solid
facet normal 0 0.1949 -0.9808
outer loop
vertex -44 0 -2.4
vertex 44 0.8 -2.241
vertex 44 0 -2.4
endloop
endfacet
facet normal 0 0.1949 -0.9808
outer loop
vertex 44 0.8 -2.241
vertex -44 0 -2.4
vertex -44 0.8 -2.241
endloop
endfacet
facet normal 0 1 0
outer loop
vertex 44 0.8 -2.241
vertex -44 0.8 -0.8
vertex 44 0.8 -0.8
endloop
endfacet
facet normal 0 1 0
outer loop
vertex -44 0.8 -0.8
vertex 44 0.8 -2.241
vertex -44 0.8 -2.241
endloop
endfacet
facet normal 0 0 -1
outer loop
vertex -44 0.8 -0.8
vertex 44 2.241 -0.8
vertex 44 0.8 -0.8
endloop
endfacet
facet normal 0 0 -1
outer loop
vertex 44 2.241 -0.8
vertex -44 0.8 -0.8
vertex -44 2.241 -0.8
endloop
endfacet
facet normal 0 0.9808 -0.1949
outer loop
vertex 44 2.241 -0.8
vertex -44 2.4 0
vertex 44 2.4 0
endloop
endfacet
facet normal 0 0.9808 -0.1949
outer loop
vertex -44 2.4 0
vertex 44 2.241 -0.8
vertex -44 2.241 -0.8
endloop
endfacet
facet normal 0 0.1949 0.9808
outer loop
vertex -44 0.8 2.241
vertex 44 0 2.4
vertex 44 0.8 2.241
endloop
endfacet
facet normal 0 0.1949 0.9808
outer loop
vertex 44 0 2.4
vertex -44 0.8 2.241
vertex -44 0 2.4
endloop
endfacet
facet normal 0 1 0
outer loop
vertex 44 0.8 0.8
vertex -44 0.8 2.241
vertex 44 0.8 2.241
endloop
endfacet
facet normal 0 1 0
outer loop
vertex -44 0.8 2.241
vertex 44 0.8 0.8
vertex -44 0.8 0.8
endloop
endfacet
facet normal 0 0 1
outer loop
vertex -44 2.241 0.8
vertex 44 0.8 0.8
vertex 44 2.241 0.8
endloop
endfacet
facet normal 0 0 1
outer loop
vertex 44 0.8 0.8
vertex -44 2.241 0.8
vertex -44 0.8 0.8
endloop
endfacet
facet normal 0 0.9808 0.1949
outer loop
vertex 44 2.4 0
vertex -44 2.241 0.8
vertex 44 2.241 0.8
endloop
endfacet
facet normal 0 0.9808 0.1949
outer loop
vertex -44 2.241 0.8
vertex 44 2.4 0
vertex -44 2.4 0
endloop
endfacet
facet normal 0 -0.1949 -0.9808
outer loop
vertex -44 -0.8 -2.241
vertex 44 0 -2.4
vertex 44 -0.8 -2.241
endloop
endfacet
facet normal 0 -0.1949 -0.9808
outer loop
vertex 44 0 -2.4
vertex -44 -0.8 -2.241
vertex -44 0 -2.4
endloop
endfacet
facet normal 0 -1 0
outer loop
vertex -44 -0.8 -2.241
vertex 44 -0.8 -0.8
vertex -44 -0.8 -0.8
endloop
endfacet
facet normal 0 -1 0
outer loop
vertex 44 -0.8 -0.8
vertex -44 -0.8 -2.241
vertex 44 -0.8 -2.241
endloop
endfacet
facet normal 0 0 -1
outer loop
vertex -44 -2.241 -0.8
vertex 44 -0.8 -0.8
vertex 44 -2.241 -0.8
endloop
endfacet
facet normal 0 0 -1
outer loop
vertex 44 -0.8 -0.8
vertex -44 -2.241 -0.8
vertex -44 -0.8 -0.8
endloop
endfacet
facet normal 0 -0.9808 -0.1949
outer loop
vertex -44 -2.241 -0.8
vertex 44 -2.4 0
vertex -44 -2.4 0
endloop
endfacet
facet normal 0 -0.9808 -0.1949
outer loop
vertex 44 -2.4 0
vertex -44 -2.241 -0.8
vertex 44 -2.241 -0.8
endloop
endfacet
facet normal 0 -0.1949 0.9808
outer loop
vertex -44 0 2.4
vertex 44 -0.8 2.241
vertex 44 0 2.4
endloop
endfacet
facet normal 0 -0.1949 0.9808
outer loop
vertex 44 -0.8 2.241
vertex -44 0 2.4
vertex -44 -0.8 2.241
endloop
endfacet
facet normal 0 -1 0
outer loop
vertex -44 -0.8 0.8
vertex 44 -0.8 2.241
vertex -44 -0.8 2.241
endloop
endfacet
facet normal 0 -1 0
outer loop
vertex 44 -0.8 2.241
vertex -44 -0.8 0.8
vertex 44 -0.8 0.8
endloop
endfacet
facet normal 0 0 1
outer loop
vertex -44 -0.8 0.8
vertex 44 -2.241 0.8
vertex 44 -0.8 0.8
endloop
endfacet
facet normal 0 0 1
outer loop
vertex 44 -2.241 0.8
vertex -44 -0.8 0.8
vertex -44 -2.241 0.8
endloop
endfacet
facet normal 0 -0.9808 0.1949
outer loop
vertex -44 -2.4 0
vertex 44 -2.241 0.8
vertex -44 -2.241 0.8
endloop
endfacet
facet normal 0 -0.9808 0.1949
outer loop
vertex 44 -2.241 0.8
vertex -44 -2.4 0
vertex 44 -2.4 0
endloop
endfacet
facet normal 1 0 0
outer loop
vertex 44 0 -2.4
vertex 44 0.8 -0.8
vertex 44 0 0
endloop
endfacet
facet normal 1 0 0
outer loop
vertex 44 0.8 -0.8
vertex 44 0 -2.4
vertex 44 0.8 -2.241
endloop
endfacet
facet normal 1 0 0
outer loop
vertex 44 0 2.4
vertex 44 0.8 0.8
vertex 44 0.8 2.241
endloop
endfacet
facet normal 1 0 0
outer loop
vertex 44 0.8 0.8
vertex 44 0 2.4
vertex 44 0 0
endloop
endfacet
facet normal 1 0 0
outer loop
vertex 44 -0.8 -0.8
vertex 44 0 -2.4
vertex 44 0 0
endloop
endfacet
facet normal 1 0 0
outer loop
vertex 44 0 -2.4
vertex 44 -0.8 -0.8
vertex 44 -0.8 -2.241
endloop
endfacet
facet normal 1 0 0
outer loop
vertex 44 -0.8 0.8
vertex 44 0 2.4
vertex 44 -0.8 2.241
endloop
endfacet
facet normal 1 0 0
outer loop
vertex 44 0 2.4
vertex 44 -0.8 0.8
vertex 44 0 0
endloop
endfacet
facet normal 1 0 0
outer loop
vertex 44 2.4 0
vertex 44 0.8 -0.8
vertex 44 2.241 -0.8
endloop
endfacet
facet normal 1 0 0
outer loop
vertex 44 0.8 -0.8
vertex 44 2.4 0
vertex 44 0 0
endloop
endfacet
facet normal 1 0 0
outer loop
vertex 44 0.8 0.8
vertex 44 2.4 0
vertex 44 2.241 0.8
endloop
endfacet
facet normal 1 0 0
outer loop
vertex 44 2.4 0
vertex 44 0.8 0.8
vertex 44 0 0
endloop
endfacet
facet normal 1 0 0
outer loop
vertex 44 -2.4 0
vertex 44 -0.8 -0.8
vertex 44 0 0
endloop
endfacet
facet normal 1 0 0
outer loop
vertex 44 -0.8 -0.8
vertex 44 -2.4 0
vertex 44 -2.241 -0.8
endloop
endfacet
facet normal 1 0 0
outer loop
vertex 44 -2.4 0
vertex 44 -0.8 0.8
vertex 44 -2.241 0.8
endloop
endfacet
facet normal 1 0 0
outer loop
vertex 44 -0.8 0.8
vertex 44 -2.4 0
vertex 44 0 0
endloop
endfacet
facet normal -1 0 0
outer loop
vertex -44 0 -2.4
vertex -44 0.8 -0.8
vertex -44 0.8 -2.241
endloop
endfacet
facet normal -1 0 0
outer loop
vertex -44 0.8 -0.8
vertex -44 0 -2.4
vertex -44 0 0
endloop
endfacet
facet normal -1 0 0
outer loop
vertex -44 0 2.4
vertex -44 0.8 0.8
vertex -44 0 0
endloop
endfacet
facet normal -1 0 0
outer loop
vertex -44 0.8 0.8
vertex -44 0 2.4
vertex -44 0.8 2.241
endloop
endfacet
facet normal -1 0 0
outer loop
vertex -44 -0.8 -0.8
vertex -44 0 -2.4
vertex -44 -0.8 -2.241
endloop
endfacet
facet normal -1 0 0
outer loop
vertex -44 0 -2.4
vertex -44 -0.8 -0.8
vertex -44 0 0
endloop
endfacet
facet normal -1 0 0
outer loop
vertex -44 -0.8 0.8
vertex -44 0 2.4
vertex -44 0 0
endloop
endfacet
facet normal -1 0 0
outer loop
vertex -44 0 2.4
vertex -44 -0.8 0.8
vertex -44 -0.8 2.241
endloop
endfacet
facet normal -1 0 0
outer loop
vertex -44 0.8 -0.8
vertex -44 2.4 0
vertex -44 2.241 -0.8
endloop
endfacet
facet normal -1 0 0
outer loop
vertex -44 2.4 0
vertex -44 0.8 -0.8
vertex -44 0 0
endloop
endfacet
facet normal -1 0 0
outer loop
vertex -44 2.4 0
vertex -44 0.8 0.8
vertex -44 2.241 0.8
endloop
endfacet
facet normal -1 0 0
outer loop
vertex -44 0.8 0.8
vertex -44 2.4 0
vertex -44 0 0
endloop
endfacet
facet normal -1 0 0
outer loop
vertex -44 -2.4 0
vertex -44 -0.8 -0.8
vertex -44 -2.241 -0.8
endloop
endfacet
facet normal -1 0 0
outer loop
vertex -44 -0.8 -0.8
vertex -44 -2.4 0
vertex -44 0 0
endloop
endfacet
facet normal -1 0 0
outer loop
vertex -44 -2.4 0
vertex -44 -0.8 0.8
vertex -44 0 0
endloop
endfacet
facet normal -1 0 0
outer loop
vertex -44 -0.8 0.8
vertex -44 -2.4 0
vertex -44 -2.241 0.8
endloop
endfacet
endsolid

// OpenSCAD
// file: ../p/axle.scad
use <../lib.scad>
function ldraw_lib__axle() = [
// 0 Axle
// 0 Name: axle.dat
// 0 Author: James Jessiman
// 0 !LDRAW_ORG Primitive UPDATE 2003-01
// 0 !LICENSE Licensed under CC BY 4.0 : see CAreadme.txt
// 
// 0 BFC CERTIFY CCW
  [0,"BFC","CERTIFY"],
  [0,"BFC","CCW"],
// 
// 0 !HISTORY 2000-04-23 [sbliss] Added conditional edges along outermost diameters
// 0 !HISTORY 2000-05-07 [PTadmin] Official Update 2000-01
// 0 !HISTORY 2002-11-08 [OrionP] Adjusted fit and precision
// 0 !HISTORY 2003-03-12 [PTadmin] Official Update 2003-01
// 0 !HISTORY 2007-06-24 [PTadmin] Header formatted for Contributor Agreement
// 0 !HISTORY 2008-07-01 [PTadmin] Official Update 2008-01
// 
// 
// 5 24 6 0 0 6 1 0 5.602 0 2 5.602 0 -2
  [5,24,6,0,0,6,1,0,5.602,0,2,5.602,0,-2],
// 5 24 0 0 6 0 1 6 2 0 5.602 -2 0 5.602
  [5,24,0,0,6,0,1,6,2,0,5.602,-2,0,5.602],
// 5 24 -6 0 0 -6 1 0 -5.602 0 -2 -5.602 0 2
  [5,24,-6,0,0,-6,1,0,-5.602,0,-2,-5.602,0,2],
// 5 24 0 0 -6 0 1 -6 -2 0 -5.602 2 0 -5.602
  [5,24,0,0,-6,0,1,-6,-2,0,-5.602,2,0,-5.602],
// 
// 2 24 6 0 0 5.602 0 2
  [2,24,6,0,0,5.602,0,2],
// 2 24 5.602 0 2 2 0 2
  [2,24,5.602,0,2,2,0,2],
// 2 24 2 0 2 2 0 5.602
  [2,24,2,0,2,2,0,5.602],
// 2 24 2 0 5.602 0 0 6
  [2,24,2,0,5.602,0,0,6],
// 2 24 -6 0 0 -5.602 0 2
  [2,24,-6,0,0,-5.602,0,2],
// 2 24 -5.602 0 2 -2 0 2
  [2,24,-5.602,0,2,-2,0,2],
// 2 24 -2 0 2 -2 0 5.602
  [2,24,-2,0,2,-2,0,5.602],
// 2 24 -2 0 5.602 -0 0 6
  [2,24,-2,0,5.602,-0,0,6],
// 2 24 6 0 -0 5.602 0 -2
  [2,24,6,0,-0,5.602,0,-2],
// 2 24 5.602 0 -2 2 0 -2
  [2,24,5.602,0,-2,2,0,-2],
// 2 24 2 0 -2 2 0 -5.602
  [2,24,2,0,-2,2,0,-5.602],
// 2 24 2 0 -5.602 0 0 -6
  [2,24,2,0,-5.602,0,0,-6],
// 2 24 -6 0 -0 -5.602 0 -2
  [2,24,-6,0,-0,-5.602,0,-2],
// 2 24 -5.602 0 -2 -2 0 -2
  [2,24,-5.602,0,-2,-2,0,-2],
// 2 24 -2 0 -2 -2 0 -5.602
  [2,24,-2,0,-2,-2,0,-5.602],
// 2 24 -2 0 -5.602 -0 0 -6
  [2,24,-2,0,-5.602,-0,0,-6],
// 2 24 6 1 0 5.602 1 2
  [2,24,6,1,0,5.602,1,2],
// 2 24 5.602 1 2 2 1 2
  [2,24,5.602,1,2,2,1,2],
// 2 24 2 1 2 2 1 5.602
  [2,24,2,1,2,2,1,5.602],
// 2 24 2 1 5.602 0 1 6
  [2,24,2,1,5.602,0,1,6],
// 2 24 -6 1 0 -5.602 1 2
  [2,24,-6,1,0,-5.602,1,2],
// 2 24 -5.602 1 2 -2 1 2
  [2,24,-5.602,1,2,-2,1,2],
// 2 24 -2 1 2 -2 1 5.602
  [2,24,-2,1,2,-2,1,5.602],
// 2 24 -2 1 5.602 -0 1 6
  [2,24,-2,1,5.602,-0,1,6],
// 2 24 6 1 -0 5.602 1 -2
  [2,24,6,1,-0,5.602,1,-2],
// 2 24 5.602 1 -2 2 1 -2
  [2,24,5.602,1,-2,2,1,-2],
// 2 24 2 1 -2 2 1 -5.602
  [2,24,2,1,-2,2,1,-5.602],
// 2 24 2 1 -5.602 0 1 -6
  [2,24,2,1,-5.602,0,1,-6],
// 2 24 -6 1 -0 -5.602 1 -2
  [2,24,-6,1,-0,-5.602,1,-2],
// 2 24 -5.602 1 -2 -2 1 -2
  [2,24,-5.602,1,-2,-2,1,-2],
// 2 24 -2 1 -2 -2 1 -5.602
  [2,24,-2,1,-2,-2,1,-5.602],
// 2 24 -2 1 -5.602 -0 1 -6
  [2,24,-2,1,-5.602,-0,1,-6],
// 
// 2 24 5.602 0 2 5.602 1 2
  [2,24,5.602,0,2,5.602,1,2],
// 2 24 2 0 2 2 1 2
  [2,24,2,0,2,2,1,2],
// 2 24 2 0 5.602 2 1 5.602
  [2,24,2,0,5.602,2,1,5.602],
// 2 24 -5.602 0 2 -5.602 1 2
  [2,24,-5.602,0,2,-5.602,1,2],
// 2 24 -2 0 2 -2 1 2
  [2,24,-2,0,2,-2,1,2],
// 2 24 -2 0 5.602 -2 1 5.602
  [2,24,-2,0,5.602,-2,1,5.602],
// 2 24 5.602 0 -2 5.602 1 -2
  [2,24,5.602,0,-2,5.602,1,-2],
// 2 24 2 0 -2 2 1 -2
  [2,24,2,0,-2,2,1,-2],
// 2 24 2 0 -5.602 2 1 -5.602
  [2,24,2,0,-5.602,2,1,-5.602],
// 2 24 -5.602 0 -2 -5.602 1 -2
  [2,24,-5.602,0,-2,-5.602,1,-2],
// 2 24 -2 0 -2 -2 1 -2
  [2,24,-2,0,-2,-2,1,-2],
// 2 24 -2 0 -5.602 -2 1 -5.602
  [2,24,-2,0,-5.602,-2,1,-5.602],
// 
// 4 16 6 0 0 6 1 0 5.602 1 2 5.602 0 2
  [4,16,6,0,0,6,1,0,5.602,1,2,5.602,0,2],
// 4 16 5.602 0 2 5.602 1 2 2 1 2 2 0 2
  [4,16,5.602,0,2,5.602,1,2,2,1,2,2,0,2],
// 4 16 2 0 2 2 1 2 2 1 5.602 2 0 5.602
  [4,16,2,0,2,2,1,2,2,1,5.602,2,0,5.602],
// 4 16 2 0 5.602 2 1 5.602 0 1 6 0 0 6
  [4,16,2,0,5.602,2,1,5.602,0,1,6,0,0,6],
// 4 16 -6 0 0 -5.602 0 2 -5.602 1 2 -6 1 0
  [4,16,-6,0,0,-5.602,0,2,-5.602,1,2,-6,1,0],
// 4 16 -5.602 0 2 -2 0 2 -2 1 2 -5.602 1 2
  [4,16,-5.602,0,2,-2,0,2,-2,1,2,-5.602,1,2],
// 4 16 -2 0 2 -2 0 5.602 -2 1 5.602 -2 1 2
  [4,16,-2,0,2,-2,0,5.602,-2,1,5.602,-2,1,2],
// 4 16 -2 0 5.602 -0 0 6 -0 1 6 -2 1 5.602
  [4,16,-2,0,5.602,-0,0,6,-0,1,6,-2,1,5.602],
// 4 16 6 0 -0 5.602 0 -2 5.602 1 -2 6 1 -0
  [4,16,6,0,-0,5.602,0,-2,5.602,1,-2,6,1,-0],
// 4 16 5.602 0 -2 2 0 -2 2 1 -2 5.602 1 -2
  [4,16,5.602,0,-2,2,0,-2,2,1,-2,5.602,1,-2],
// 4 16 2 0 -2 2 0 -5.602 2 1 -5.602 2 1 -2
  [4,16,2,0,-2,2,0,-5.602,2,1,-5.602,2,1,-2],
// 4 16 2 0 -5.602 0 0 -6 0 1 -6 2 1 -5.602
  [4,16,2,0,-5.602,0,0,-6,0,1,-6,2,1,-5.602],
// 4 16 -6 0 -0 -6 1 -0 -5.602 1 -2 -5.602 0 -2
  [4,16,-6,0,-0,-6,1,-0,-5.602,1,-2,-5.602,0,-2],
// 4 16 -5.602 0 -2 -5.602 1 -2 -2 1 -2 -2 0 -2
  [4,16,-5.602,0,-2,-5.602,1,-2,-2,1,-2,-2,0,-2],
// 4 16 -2 0 -2 -2 1 -2 -2 1 -5.602 -2 0 -5.602
  [4,16,-2,0,-2,-2,1,-2,-2,1,-5.602,-2,0,-5.602],
// 4 16 -2 0 -5.602 -2 1 -5.602 -0 1 -6 -0 0 -6
  [4,16,-2,0,-5.602,-2,1,-5.602,-0,1,-6,-0,0,-6],
// 
// 4 16 6 0 0 5.602 0 2 2 0 2 0 0 0
  [4,16,6,0,0,5.602,0,2,2,0,2,0,0,0],
// 4 16 -6 0 0 0 0 0 -2 0 2 -5.602 0 2
  [4,16,-6,0,0,0,0,0,-2,0,2,-5.602,0,2],
// 4 16 6 0 0 0 0 0 2 0 -2 5.602 0 -2
  [4,16,6,0,0,0,0,0,2,0,-2,5.602,0,-2],
// 4 16 -6 0 0 -5.602 0 -2 -2 0 -2 0 0 0
  [4,16,-6,0,0,-5.602,0,-2,-2,0,-2,0,0,0],
// 4 16 0 0 6 0 0 0 2 0 2 2 0 5.602
  [4,16,0,0,6,0,0,0,2,0,2,2,0,5.602],
// 4 16 0 0 6 -2 0 5.602 -2 0 2 0 0 0
  [4,16,0,0,6,-2,0,5.602,-2,0,2,0,0,0],
// 4 16 0 0 -6 2 0 -5.602 2 0 -2 0 0 0
  [4,16,0,0,-6,2,0,-5.602,2,0,-2,0,0,0],
// 4 16 0 0 -6 0 0 0 -2 0 -2 -2 0 -5.602
  [4,16,0,0,-6,0,0,0,-2,0,-2,-2,0,-5.602],
// 4 16 6 1 0 0 1 0 2 1 2 5.602 1 2
  [4,16,6,1,0,0,1,0,2,1,2,5.602,1,2],
// 4 16 -6 1 0 -5.602 1 2 -2 1 2 0 1 0
  [4,16,-6,1,0,-5.602,1,2,-2,1,2,0,1,0],
// 4 16 6 1 0 5.602 1 -2 2 1 -2 0 1 0
  [4,16,6,1,0,5.602,1,-2,2,1,-2,0,1,0],
// 4 16 -6 1 0 0 1 0 -2 1 -2 -5.602 1 -2
  [4,16,-6,1,0,0,1,0,-2,1,-2,-5.602,1,-2],
// 4 16 0 1 6 2 1 5.602 2 1 2 0 1 0
  [4,16,0,1,6,2,1,5.602,2,1,2,0,1,0],
// 4 16 0 1 6 0 1 0 -2 1 2 -2 1 5.602
  [4,16,0,1,6,0,1,0,-2,1,2,-2,1,5.602],
// 4 16 0 1 -6 0 1 0 2 1 -2 2 1 -5.602
  [4,16,0,1,-6,0,1,0,2,1,-2,2,1,-5.602],
// 4 16 0 1 -6 -2 1 -5.602 -2 1 -2 0 1 0
  [4,16,0,1,-6,-2,1,-5.602,-2,1,-2,0,1,0],
// 0
];
module ldraw_lib__axle(step=0, col=false, unit=2/5, alt=false, line=0.2, solid=!$preview)
    makepoly(ldraw_lib__axle(), step=step, col=col, unit=unit, alt=alt, line=line, solid=solid);
ldraw_lib__axle(line=0.2);
// main file
use <../lib.scad>
use <../p/axle.scad>
function ldraw_lib__23948() = [
// 0 Technic Axle 11
// 0 Name: 23948.dat
// 0 Author: Rolf Osterthun [Rolf]
// 0 !LDRAW_ORG Part UPDATE 2016-01
// 0 !LICENSE Licensed under CC BY 4.0 : see CAreadme.txt
// 
// 0 BFC CERTIFY CCW
  [0,"BFC","CERTIFY"],
  [0,"BFC","CCW"],
// 
// 0 !HISTORY 2016-12-31 [PTadmin] Official Update 2016-01
// 
// 
// 1 16 110 0 0 0 -220 0 1 0 0 0 0 1 axle.dat
  [1,16,110,0,0,0,-220,0,1,0,0,0,0,1, ldraw_lib__axle()],
];
module ldraw_lib__23948(step=0, col=false, unit=2/5, alt=false, line=0.2, solid=!$preview)
    makepoly(ldraw_lib__23948(), step=step, col=col, unit=unit, alt=alt, line=line, solid=solid);
ldraw_lib__23948(line=0.2);
